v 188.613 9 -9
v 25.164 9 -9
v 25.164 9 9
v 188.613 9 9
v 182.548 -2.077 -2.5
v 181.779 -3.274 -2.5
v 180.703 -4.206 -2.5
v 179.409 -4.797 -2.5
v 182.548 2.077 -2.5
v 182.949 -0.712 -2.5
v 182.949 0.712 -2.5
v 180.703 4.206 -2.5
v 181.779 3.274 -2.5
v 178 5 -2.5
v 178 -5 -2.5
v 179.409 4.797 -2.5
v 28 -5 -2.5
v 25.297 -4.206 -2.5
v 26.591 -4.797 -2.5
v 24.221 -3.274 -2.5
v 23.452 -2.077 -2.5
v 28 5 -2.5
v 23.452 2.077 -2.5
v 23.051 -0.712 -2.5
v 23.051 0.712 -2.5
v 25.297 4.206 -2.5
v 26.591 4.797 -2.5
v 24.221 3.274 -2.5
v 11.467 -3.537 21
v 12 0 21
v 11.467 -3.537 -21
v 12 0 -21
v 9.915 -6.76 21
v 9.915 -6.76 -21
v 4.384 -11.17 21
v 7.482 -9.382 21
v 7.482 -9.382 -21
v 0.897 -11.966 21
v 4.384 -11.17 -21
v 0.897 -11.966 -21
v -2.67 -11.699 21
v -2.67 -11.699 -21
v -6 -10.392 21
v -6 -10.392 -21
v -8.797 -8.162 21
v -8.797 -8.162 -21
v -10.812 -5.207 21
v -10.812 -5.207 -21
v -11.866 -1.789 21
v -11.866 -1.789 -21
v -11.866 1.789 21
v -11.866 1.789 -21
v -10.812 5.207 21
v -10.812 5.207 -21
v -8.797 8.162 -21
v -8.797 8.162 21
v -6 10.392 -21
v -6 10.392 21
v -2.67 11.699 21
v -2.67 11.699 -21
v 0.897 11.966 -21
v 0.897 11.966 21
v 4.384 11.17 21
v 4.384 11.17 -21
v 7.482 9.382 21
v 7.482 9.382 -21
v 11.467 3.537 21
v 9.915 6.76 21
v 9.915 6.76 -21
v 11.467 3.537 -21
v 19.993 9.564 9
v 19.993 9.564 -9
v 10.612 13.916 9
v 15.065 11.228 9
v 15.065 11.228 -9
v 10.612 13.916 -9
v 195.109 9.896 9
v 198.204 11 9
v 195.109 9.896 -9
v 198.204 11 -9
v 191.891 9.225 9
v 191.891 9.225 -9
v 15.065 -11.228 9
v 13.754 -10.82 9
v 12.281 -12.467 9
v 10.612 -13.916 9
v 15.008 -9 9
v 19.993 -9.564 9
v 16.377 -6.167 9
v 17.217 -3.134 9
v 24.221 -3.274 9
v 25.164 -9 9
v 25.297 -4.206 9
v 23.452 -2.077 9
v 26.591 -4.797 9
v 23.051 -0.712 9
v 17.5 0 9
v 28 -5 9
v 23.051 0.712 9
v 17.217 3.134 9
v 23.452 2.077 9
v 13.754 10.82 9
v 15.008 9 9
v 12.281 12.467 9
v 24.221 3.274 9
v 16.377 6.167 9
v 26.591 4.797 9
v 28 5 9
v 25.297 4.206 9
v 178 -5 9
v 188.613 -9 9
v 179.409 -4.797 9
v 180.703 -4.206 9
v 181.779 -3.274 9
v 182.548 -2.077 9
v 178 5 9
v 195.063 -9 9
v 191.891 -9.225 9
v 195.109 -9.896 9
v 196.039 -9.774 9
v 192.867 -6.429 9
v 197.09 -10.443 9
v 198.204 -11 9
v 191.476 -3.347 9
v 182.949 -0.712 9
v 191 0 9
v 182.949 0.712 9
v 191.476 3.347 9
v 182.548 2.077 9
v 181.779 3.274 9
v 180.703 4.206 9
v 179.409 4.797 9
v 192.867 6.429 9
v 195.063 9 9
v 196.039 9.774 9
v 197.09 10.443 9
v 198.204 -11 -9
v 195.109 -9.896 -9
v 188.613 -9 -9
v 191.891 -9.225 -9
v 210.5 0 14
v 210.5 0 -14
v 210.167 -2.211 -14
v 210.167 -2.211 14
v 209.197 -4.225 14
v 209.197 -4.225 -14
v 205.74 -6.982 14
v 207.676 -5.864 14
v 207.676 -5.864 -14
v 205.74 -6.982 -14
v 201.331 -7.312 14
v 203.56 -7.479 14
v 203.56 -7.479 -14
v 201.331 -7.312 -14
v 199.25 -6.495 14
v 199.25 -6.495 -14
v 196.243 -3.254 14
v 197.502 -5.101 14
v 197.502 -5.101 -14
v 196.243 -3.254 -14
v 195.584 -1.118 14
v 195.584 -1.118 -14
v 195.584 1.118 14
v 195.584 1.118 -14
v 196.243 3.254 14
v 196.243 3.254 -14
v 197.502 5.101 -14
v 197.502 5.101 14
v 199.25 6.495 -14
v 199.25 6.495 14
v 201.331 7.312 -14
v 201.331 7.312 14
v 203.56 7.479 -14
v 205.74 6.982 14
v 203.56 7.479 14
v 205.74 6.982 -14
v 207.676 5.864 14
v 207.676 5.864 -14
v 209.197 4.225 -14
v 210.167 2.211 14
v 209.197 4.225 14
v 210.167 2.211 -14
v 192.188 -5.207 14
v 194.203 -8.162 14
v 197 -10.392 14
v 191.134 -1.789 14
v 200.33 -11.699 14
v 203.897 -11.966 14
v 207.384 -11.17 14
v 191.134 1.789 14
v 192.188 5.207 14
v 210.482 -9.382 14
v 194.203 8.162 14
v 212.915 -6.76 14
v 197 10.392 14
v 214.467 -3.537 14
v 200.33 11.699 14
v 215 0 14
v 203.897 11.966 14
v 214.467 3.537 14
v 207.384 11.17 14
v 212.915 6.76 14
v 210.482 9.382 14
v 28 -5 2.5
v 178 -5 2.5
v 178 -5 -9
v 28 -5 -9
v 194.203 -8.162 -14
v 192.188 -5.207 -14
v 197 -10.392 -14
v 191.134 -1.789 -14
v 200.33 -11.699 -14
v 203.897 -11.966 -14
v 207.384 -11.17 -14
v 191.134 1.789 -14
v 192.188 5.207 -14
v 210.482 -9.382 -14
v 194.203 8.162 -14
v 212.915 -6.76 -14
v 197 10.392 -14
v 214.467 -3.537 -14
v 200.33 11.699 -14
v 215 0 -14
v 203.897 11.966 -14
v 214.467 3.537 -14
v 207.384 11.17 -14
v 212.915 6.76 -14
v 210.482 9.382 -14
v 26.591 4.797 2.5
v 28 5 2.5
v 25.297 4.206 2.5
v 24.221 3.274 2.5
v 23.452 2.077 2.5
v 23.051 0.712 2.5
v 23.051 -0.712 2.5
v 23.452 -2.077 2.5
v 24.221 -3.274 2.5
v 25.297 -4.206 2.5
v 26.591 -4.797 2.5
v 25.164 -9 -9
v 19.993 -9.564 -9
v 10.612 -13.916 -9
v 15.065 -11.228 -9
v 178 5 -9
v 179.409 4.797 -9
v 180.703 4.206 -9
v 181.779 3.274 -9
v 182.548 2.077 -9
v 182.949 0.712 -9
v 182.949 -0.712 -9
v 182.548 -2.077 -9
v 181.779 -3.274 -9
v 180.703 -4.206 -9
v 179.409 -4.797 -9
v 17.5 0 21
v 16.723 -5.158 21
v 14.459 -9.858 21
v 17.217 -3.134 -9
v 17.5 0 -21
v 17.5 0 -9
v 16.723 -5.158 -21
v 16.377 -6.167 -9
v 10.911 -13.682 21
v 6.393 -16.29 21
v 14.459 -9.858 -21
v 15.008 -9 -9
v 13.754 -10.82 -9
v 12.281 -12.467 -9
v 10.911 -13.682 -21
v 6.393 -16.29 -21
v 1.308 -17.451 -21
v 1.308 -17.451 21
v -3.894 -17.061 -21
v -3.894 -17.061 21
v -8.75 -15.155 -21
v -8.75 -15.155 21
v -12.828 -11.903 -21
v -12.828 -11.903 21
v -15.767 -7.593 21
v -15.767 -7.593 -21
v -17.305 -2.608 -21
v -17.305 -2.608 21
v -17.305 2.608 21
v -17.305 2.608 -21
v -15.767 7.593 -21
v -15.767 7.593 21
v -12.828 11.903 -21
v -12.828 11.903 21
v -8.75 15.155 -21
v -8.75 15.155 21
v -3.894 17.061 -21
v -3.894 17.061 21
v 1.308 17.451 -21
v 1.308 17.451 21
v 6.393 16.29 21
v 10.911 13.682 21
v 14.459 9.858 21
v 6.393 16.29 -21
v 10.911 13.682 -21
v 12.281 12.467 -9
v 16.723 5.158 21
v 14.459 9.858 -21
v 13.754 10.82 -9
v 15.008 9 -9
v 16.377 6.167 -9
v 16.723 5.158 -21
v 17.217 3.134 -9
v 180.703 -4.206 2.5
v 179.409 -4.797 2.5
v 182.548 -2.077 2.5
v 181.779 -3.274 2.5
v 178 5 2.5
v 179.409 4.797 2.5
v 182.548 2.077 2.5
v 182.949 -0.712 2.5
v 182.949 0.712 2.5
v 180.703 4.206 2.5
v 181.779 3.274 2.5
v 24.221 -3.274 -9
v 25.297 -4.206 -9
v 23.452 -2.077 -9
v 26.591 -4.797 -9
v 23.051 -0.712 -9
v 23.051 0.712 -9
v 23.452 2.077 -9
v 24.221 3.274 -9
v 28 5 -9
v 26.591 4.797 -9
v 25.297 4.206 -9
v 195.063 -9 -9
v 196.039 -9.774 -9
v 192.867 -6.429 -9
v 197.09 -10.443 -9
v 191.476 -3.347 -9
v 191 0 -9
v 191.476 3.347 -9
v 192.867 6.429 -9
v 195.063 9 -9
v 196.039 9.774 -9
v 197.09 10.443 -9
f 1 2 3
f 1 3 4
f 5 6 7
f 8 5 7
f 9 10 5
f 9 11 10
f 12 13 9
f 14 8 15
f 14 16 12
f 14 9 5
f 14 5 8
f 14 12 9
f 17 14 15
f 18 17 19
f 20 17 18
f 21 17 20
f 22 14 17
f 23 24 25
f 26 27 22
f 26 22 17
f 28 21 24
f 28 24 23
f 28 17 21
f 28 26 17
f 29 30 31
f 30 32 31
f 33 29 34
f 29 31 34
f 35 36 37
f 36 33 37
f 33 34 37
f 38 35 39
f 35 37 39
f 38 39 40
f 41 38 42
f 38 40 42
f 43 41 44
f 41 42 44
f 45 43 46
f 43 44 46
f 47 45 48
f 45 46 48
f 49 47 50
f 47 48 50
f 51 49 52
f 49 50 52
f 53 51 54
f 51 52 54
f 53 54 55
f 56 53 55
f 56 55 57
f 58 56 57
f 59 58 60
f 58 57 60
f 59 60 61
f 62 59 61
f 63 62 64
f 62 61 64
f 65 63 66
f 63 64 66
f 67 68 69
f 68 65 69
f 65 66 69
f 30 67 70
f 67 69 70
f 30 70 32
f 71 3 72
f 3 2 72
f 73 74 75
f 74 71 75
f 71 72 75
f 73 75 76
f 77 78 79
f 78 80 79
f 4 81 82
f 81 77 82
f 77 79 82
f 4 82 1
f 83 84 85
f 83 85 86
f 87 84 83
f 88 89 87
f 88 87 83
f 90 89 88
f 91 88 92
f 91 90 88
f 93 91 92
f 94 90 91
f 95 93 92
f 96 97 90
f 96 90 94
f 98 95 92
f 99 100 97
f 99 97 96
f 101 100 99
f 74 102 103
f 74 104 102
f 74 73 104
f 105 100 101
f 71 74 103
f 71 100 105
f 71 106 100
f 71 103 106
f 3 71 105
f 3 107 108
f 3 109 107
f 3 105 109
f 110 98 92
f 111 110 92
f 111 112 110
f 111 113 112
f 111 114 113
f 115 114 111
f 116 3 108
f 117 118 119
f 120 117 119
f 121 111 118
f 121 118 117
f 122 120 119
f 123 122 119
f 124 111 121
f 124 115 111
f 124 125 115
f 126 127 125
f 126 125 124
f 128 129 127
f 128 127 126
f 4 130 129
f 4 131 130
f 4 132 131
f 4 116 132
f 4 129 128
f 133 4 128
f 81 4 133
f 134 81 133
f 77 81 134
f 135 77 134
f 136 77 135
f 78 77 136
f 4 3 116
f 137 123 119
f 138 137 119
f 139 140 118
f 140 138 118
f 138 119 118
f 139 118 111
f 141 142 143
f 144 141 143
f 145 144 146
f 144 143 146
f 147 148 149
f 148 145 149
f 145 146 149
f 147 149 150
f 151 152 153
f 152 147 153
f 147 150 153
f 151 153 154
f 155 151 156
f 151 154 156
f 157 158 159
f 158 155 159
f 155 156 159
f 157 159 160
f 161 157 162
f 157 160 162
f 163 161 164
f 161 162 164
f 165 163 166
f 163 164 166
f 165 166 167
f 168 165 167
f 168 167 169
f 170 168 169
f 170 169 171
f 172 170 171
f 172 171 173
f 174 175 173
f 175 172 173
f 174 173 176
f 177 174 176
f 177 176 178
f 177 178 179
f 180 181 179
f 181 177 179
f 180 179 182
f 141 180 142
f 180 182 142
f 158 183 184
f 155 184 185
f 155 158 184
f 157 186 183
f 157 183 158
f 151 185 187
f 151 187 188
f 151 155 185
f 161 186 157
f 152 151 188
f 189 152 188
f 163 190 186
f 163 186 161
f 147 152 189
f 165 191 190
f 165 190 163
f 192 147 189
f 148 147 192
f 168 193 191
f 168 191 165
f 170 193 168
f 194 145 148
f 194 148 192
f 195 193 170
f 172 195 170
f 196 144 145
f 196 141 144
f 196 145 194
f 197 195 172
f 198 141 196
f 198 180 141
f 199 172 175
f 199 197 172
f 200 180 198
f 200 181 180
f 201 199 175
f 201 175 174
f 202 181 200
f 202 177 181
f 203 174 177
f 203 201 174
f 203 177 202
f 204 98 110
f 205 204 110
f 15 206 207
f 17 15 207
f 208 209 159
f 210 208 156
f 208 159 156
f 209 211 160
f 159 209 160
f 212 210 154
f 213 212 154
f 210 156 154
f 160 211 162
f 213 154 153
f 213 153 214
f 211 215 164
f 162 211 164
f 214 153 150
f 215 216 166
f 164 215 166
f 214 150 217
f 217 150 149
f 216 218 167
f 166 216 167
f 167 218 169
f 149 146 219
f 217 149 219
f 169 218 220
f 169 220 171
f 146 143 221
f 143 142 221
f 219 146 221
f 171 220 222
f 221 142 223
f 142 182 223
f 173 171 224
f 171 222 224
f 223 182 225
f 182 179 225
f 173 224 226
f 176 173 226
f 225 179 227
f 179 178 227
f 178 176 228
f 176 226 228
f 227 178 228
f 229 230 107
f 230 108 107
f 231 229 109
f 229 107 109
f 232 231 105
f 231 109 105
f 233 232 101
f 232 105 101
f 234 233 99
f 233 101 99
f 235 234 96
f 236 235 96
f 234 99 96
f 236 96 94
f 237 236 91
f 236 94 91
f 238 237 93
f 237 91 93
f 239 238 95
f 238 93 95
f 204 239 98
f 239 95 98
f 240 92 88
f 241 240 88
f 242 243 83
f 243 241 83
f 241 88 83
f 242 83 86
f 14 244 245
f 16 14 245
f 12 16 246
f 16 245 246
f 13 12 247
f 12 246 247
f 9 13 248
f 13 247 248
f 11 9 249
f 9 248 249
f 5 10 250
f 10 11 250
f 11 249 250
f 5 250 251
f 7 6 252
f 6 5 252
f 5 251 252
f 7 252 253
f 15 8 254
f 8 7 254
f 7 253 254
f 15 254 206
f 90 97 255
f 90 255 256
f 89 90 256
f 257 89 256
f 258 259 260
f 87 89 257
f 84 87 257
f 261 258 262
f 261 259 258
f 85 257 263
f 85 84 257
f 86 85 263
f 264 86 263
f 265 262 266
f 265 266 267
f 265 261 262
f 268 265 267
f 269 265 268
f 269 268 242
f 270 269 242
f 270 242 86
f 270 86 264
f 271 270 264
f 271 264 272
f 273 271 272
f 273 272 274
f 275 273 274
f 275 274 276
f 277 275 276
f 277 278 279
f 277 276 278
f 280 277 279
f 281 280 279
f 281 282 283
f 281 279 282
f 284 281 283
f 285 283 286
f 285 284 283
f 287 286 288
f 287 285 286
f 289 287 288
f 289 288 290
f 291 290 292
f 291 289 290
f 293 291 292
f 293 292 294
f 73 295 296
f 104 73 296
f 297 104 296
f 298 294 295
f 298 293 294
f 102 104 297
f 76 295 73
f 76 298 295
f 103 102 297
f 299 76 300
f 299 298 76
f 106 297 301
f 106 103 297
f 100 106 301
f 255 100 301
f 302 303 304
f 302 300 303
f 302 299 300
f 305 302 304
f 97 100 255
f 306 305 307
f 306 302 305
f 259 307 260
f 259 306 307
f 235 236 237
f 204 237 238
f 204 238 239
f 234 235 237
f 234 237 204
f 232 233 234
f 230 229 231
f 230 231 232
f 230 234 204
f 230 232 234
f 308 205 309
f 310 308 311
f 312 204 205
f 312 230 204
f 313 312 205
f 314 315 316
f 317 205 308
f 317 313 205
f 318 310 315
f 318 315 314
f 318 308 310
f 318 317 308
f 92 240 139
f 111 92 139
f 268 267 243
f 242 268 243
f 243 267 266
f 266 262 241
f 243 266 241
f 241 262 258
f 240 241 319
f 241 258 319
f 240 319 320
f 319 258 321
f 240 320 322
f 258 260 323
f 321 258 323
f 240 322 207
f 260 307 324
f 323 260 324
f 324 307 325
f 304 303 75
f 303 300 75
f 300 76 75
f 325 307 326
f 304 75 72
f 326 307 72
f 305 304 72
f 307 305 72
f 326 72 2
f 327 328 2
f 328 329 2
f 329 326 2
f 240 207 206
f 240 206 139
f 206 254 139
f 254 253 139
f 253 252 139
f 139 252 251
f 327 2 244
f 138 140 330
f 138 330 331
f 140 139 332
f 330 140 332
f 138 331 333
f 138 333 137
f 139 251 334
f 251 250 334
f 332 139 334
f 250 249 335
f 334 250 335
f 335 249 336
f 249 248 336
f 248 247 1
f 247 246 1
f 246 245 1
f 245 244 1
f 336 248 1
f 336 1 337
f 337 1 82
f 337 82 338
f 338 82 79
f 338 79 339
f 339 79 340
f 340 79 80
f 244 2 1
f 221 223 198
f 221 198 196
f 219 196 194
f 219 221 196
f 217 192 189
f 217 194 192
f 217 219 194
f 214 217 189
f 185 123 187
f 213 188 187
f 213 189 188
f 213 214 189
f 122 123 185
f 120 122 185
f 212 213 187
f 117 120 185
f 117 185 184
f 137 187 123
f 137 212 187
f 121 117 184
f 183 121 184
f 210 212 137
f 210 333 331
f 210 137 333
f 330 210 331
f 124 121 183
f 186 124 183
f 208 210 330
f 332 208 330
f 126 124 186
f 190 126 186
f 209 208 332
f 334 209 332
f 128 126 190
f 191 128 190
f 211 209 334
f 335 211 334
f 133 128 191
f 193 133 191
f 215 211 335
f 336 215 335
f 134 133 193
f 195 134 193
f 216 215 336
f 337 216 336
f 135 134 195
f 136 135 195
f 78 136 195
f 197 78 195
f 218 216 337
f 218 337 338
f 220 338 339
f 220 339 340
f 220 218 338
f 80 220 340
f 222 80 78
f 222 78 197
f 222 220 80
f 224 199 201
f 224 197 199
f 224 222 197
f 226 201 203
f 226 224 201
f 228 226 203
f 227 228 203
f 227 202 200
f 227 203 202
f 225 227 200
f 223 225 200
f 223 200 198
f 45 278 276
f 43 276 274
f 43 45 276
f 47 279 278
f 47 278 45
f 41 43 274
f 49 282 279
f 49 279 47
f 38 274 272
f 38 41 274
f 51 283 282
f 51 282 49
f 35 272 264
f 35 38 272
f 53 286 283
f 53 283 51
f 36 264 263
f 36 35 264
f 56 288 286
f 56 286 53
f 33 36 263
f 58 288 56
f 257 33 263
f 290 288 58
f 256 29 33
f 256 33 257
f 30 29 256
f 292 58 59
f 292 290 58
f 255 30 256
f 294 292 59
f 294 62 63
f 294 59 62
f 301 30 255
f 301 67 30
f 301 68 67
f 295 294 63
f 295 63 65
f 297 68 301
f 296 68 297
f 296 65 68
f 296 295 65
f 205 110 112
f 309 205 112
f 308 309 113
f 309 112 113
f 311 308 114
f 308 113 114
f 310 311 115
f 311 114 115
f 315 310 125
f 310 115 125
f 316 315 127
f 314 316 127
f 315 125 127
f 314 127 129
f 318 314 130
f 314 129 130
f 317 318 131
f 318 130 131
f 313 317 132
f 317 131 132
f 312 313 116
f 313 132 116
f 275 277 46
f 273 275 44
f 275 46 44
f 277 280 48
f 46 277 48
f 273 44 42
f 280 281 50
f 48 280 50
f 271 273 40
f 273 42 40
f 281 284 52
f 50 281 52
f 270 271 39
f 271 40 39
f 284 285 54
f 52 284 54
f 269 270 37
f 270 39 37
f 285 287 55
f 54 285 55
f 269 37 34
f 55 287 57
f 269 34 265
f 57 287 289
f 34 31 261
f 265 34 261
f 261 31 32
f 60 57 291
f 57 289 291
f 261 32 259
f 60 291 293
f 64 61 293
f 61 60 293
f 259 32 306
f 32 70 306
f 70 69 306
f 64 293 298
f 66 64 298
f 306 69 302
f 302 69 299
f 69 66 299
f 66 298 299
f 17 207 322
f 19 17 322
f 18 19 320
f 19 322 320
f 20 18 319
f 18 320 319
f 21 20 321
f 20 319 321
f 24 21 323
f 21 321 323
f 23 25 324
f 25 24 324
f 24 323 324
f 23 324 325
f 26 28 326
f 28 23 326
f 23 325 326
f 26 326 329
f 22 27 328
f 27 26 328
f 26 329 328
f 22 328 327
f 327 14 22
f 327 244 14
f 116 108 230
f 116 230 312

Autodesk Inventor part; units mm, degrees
ref_plane "YZ Plane" through (0, 0, 0) normal (1, 0, 0) x (0, 1, 0)
ref_plane "XZ Plane" through (0, 0, 0) normal (0, 1, 0) x (-1, 0, 0)
ref_plane "XY Plane" through (0, 0, 0) normal (0, 0, 1) x (1, 0, 0)
sketch "Esboço1" plane through (0, 0, 0) normal (0, 0, 1) x (1, 0, 0)
  circle A0 centre (0, 0) radius 12
  circle A1 centre (0, 0) radius 17.5
  dimension "d1" = 24
  dimension "d0" = 35
extrude "Extrusão1" add sketch "Esboço1" along normal mid plane 42
sketch "Esboço2" plane through (0, 0, 0) normal (0, 0, 1) x (1, 0, 0)
  circle A0 centre (203, 0) radius 12
  circle A1 centre (203, 0) radius 7.5
  point P0 (0, 0)
  dimension "d5" = 24
  dimension "d6" = 15
  dimension "d9" = 203
extrude "Extrusão2" add sketch "Esboço2" along normal mid plane 28
sketch "Esboço4" plane through (0, 0, 0) normal (0, 0, 1) x (1, 0, 0)
  line L0 (7.9373, 9) -> (195.0627, 9)
  circle A0 centre (0, 0) radius 17.5 projected
  circle A1 centre (0, 0) radius 12 projected
  circle A2 centre (203, 0) radius 12 projected
  circle A3 centre (203, 0) radius 7.5 projected
  line L1 (15.0083, -9) -> (195.0627, -9)
  point P0 (15.0083, 9)
  dimension "d11" = 9
extrude "Extrusão3" add sketch "Esboço4" along normal mid plane 18 contours L0 A2 L1 A0
sketch "Esboço5" plane through (0, 0, 9) normal (0, 0, 1) x (1, 0, 0)
  arc A0 (28, 5) -> (28, -5) centre (28, 0) ccw
  arc A1 (178, -5) -> (178, 5) centre (178, 0) ccw
  line L0 (28, -5) -> (178, -5)
  line L1 (28, 5) -> (178, 5)
  point P0 (0, 0)
  dimension "d14" = 28
  dimension "d15" = 150
  dimension "d16" = 10
  dimension "d17" = 5
extrude "Extrusão4" cut sketch "Esboço5" against normal blind 6.5
mirror "Espelhamento1" about plane through (0, 0, 0) normal (0, 0, 1) of "Extrusão4"
fillet "Arredondamento1" radius 24 4 edges at (15.0083, 9, 0) (195.0627, 9, 0) (195.0627, -9, 0) (15.0083, -9, 0)
properties part number "18" material "Aço"
